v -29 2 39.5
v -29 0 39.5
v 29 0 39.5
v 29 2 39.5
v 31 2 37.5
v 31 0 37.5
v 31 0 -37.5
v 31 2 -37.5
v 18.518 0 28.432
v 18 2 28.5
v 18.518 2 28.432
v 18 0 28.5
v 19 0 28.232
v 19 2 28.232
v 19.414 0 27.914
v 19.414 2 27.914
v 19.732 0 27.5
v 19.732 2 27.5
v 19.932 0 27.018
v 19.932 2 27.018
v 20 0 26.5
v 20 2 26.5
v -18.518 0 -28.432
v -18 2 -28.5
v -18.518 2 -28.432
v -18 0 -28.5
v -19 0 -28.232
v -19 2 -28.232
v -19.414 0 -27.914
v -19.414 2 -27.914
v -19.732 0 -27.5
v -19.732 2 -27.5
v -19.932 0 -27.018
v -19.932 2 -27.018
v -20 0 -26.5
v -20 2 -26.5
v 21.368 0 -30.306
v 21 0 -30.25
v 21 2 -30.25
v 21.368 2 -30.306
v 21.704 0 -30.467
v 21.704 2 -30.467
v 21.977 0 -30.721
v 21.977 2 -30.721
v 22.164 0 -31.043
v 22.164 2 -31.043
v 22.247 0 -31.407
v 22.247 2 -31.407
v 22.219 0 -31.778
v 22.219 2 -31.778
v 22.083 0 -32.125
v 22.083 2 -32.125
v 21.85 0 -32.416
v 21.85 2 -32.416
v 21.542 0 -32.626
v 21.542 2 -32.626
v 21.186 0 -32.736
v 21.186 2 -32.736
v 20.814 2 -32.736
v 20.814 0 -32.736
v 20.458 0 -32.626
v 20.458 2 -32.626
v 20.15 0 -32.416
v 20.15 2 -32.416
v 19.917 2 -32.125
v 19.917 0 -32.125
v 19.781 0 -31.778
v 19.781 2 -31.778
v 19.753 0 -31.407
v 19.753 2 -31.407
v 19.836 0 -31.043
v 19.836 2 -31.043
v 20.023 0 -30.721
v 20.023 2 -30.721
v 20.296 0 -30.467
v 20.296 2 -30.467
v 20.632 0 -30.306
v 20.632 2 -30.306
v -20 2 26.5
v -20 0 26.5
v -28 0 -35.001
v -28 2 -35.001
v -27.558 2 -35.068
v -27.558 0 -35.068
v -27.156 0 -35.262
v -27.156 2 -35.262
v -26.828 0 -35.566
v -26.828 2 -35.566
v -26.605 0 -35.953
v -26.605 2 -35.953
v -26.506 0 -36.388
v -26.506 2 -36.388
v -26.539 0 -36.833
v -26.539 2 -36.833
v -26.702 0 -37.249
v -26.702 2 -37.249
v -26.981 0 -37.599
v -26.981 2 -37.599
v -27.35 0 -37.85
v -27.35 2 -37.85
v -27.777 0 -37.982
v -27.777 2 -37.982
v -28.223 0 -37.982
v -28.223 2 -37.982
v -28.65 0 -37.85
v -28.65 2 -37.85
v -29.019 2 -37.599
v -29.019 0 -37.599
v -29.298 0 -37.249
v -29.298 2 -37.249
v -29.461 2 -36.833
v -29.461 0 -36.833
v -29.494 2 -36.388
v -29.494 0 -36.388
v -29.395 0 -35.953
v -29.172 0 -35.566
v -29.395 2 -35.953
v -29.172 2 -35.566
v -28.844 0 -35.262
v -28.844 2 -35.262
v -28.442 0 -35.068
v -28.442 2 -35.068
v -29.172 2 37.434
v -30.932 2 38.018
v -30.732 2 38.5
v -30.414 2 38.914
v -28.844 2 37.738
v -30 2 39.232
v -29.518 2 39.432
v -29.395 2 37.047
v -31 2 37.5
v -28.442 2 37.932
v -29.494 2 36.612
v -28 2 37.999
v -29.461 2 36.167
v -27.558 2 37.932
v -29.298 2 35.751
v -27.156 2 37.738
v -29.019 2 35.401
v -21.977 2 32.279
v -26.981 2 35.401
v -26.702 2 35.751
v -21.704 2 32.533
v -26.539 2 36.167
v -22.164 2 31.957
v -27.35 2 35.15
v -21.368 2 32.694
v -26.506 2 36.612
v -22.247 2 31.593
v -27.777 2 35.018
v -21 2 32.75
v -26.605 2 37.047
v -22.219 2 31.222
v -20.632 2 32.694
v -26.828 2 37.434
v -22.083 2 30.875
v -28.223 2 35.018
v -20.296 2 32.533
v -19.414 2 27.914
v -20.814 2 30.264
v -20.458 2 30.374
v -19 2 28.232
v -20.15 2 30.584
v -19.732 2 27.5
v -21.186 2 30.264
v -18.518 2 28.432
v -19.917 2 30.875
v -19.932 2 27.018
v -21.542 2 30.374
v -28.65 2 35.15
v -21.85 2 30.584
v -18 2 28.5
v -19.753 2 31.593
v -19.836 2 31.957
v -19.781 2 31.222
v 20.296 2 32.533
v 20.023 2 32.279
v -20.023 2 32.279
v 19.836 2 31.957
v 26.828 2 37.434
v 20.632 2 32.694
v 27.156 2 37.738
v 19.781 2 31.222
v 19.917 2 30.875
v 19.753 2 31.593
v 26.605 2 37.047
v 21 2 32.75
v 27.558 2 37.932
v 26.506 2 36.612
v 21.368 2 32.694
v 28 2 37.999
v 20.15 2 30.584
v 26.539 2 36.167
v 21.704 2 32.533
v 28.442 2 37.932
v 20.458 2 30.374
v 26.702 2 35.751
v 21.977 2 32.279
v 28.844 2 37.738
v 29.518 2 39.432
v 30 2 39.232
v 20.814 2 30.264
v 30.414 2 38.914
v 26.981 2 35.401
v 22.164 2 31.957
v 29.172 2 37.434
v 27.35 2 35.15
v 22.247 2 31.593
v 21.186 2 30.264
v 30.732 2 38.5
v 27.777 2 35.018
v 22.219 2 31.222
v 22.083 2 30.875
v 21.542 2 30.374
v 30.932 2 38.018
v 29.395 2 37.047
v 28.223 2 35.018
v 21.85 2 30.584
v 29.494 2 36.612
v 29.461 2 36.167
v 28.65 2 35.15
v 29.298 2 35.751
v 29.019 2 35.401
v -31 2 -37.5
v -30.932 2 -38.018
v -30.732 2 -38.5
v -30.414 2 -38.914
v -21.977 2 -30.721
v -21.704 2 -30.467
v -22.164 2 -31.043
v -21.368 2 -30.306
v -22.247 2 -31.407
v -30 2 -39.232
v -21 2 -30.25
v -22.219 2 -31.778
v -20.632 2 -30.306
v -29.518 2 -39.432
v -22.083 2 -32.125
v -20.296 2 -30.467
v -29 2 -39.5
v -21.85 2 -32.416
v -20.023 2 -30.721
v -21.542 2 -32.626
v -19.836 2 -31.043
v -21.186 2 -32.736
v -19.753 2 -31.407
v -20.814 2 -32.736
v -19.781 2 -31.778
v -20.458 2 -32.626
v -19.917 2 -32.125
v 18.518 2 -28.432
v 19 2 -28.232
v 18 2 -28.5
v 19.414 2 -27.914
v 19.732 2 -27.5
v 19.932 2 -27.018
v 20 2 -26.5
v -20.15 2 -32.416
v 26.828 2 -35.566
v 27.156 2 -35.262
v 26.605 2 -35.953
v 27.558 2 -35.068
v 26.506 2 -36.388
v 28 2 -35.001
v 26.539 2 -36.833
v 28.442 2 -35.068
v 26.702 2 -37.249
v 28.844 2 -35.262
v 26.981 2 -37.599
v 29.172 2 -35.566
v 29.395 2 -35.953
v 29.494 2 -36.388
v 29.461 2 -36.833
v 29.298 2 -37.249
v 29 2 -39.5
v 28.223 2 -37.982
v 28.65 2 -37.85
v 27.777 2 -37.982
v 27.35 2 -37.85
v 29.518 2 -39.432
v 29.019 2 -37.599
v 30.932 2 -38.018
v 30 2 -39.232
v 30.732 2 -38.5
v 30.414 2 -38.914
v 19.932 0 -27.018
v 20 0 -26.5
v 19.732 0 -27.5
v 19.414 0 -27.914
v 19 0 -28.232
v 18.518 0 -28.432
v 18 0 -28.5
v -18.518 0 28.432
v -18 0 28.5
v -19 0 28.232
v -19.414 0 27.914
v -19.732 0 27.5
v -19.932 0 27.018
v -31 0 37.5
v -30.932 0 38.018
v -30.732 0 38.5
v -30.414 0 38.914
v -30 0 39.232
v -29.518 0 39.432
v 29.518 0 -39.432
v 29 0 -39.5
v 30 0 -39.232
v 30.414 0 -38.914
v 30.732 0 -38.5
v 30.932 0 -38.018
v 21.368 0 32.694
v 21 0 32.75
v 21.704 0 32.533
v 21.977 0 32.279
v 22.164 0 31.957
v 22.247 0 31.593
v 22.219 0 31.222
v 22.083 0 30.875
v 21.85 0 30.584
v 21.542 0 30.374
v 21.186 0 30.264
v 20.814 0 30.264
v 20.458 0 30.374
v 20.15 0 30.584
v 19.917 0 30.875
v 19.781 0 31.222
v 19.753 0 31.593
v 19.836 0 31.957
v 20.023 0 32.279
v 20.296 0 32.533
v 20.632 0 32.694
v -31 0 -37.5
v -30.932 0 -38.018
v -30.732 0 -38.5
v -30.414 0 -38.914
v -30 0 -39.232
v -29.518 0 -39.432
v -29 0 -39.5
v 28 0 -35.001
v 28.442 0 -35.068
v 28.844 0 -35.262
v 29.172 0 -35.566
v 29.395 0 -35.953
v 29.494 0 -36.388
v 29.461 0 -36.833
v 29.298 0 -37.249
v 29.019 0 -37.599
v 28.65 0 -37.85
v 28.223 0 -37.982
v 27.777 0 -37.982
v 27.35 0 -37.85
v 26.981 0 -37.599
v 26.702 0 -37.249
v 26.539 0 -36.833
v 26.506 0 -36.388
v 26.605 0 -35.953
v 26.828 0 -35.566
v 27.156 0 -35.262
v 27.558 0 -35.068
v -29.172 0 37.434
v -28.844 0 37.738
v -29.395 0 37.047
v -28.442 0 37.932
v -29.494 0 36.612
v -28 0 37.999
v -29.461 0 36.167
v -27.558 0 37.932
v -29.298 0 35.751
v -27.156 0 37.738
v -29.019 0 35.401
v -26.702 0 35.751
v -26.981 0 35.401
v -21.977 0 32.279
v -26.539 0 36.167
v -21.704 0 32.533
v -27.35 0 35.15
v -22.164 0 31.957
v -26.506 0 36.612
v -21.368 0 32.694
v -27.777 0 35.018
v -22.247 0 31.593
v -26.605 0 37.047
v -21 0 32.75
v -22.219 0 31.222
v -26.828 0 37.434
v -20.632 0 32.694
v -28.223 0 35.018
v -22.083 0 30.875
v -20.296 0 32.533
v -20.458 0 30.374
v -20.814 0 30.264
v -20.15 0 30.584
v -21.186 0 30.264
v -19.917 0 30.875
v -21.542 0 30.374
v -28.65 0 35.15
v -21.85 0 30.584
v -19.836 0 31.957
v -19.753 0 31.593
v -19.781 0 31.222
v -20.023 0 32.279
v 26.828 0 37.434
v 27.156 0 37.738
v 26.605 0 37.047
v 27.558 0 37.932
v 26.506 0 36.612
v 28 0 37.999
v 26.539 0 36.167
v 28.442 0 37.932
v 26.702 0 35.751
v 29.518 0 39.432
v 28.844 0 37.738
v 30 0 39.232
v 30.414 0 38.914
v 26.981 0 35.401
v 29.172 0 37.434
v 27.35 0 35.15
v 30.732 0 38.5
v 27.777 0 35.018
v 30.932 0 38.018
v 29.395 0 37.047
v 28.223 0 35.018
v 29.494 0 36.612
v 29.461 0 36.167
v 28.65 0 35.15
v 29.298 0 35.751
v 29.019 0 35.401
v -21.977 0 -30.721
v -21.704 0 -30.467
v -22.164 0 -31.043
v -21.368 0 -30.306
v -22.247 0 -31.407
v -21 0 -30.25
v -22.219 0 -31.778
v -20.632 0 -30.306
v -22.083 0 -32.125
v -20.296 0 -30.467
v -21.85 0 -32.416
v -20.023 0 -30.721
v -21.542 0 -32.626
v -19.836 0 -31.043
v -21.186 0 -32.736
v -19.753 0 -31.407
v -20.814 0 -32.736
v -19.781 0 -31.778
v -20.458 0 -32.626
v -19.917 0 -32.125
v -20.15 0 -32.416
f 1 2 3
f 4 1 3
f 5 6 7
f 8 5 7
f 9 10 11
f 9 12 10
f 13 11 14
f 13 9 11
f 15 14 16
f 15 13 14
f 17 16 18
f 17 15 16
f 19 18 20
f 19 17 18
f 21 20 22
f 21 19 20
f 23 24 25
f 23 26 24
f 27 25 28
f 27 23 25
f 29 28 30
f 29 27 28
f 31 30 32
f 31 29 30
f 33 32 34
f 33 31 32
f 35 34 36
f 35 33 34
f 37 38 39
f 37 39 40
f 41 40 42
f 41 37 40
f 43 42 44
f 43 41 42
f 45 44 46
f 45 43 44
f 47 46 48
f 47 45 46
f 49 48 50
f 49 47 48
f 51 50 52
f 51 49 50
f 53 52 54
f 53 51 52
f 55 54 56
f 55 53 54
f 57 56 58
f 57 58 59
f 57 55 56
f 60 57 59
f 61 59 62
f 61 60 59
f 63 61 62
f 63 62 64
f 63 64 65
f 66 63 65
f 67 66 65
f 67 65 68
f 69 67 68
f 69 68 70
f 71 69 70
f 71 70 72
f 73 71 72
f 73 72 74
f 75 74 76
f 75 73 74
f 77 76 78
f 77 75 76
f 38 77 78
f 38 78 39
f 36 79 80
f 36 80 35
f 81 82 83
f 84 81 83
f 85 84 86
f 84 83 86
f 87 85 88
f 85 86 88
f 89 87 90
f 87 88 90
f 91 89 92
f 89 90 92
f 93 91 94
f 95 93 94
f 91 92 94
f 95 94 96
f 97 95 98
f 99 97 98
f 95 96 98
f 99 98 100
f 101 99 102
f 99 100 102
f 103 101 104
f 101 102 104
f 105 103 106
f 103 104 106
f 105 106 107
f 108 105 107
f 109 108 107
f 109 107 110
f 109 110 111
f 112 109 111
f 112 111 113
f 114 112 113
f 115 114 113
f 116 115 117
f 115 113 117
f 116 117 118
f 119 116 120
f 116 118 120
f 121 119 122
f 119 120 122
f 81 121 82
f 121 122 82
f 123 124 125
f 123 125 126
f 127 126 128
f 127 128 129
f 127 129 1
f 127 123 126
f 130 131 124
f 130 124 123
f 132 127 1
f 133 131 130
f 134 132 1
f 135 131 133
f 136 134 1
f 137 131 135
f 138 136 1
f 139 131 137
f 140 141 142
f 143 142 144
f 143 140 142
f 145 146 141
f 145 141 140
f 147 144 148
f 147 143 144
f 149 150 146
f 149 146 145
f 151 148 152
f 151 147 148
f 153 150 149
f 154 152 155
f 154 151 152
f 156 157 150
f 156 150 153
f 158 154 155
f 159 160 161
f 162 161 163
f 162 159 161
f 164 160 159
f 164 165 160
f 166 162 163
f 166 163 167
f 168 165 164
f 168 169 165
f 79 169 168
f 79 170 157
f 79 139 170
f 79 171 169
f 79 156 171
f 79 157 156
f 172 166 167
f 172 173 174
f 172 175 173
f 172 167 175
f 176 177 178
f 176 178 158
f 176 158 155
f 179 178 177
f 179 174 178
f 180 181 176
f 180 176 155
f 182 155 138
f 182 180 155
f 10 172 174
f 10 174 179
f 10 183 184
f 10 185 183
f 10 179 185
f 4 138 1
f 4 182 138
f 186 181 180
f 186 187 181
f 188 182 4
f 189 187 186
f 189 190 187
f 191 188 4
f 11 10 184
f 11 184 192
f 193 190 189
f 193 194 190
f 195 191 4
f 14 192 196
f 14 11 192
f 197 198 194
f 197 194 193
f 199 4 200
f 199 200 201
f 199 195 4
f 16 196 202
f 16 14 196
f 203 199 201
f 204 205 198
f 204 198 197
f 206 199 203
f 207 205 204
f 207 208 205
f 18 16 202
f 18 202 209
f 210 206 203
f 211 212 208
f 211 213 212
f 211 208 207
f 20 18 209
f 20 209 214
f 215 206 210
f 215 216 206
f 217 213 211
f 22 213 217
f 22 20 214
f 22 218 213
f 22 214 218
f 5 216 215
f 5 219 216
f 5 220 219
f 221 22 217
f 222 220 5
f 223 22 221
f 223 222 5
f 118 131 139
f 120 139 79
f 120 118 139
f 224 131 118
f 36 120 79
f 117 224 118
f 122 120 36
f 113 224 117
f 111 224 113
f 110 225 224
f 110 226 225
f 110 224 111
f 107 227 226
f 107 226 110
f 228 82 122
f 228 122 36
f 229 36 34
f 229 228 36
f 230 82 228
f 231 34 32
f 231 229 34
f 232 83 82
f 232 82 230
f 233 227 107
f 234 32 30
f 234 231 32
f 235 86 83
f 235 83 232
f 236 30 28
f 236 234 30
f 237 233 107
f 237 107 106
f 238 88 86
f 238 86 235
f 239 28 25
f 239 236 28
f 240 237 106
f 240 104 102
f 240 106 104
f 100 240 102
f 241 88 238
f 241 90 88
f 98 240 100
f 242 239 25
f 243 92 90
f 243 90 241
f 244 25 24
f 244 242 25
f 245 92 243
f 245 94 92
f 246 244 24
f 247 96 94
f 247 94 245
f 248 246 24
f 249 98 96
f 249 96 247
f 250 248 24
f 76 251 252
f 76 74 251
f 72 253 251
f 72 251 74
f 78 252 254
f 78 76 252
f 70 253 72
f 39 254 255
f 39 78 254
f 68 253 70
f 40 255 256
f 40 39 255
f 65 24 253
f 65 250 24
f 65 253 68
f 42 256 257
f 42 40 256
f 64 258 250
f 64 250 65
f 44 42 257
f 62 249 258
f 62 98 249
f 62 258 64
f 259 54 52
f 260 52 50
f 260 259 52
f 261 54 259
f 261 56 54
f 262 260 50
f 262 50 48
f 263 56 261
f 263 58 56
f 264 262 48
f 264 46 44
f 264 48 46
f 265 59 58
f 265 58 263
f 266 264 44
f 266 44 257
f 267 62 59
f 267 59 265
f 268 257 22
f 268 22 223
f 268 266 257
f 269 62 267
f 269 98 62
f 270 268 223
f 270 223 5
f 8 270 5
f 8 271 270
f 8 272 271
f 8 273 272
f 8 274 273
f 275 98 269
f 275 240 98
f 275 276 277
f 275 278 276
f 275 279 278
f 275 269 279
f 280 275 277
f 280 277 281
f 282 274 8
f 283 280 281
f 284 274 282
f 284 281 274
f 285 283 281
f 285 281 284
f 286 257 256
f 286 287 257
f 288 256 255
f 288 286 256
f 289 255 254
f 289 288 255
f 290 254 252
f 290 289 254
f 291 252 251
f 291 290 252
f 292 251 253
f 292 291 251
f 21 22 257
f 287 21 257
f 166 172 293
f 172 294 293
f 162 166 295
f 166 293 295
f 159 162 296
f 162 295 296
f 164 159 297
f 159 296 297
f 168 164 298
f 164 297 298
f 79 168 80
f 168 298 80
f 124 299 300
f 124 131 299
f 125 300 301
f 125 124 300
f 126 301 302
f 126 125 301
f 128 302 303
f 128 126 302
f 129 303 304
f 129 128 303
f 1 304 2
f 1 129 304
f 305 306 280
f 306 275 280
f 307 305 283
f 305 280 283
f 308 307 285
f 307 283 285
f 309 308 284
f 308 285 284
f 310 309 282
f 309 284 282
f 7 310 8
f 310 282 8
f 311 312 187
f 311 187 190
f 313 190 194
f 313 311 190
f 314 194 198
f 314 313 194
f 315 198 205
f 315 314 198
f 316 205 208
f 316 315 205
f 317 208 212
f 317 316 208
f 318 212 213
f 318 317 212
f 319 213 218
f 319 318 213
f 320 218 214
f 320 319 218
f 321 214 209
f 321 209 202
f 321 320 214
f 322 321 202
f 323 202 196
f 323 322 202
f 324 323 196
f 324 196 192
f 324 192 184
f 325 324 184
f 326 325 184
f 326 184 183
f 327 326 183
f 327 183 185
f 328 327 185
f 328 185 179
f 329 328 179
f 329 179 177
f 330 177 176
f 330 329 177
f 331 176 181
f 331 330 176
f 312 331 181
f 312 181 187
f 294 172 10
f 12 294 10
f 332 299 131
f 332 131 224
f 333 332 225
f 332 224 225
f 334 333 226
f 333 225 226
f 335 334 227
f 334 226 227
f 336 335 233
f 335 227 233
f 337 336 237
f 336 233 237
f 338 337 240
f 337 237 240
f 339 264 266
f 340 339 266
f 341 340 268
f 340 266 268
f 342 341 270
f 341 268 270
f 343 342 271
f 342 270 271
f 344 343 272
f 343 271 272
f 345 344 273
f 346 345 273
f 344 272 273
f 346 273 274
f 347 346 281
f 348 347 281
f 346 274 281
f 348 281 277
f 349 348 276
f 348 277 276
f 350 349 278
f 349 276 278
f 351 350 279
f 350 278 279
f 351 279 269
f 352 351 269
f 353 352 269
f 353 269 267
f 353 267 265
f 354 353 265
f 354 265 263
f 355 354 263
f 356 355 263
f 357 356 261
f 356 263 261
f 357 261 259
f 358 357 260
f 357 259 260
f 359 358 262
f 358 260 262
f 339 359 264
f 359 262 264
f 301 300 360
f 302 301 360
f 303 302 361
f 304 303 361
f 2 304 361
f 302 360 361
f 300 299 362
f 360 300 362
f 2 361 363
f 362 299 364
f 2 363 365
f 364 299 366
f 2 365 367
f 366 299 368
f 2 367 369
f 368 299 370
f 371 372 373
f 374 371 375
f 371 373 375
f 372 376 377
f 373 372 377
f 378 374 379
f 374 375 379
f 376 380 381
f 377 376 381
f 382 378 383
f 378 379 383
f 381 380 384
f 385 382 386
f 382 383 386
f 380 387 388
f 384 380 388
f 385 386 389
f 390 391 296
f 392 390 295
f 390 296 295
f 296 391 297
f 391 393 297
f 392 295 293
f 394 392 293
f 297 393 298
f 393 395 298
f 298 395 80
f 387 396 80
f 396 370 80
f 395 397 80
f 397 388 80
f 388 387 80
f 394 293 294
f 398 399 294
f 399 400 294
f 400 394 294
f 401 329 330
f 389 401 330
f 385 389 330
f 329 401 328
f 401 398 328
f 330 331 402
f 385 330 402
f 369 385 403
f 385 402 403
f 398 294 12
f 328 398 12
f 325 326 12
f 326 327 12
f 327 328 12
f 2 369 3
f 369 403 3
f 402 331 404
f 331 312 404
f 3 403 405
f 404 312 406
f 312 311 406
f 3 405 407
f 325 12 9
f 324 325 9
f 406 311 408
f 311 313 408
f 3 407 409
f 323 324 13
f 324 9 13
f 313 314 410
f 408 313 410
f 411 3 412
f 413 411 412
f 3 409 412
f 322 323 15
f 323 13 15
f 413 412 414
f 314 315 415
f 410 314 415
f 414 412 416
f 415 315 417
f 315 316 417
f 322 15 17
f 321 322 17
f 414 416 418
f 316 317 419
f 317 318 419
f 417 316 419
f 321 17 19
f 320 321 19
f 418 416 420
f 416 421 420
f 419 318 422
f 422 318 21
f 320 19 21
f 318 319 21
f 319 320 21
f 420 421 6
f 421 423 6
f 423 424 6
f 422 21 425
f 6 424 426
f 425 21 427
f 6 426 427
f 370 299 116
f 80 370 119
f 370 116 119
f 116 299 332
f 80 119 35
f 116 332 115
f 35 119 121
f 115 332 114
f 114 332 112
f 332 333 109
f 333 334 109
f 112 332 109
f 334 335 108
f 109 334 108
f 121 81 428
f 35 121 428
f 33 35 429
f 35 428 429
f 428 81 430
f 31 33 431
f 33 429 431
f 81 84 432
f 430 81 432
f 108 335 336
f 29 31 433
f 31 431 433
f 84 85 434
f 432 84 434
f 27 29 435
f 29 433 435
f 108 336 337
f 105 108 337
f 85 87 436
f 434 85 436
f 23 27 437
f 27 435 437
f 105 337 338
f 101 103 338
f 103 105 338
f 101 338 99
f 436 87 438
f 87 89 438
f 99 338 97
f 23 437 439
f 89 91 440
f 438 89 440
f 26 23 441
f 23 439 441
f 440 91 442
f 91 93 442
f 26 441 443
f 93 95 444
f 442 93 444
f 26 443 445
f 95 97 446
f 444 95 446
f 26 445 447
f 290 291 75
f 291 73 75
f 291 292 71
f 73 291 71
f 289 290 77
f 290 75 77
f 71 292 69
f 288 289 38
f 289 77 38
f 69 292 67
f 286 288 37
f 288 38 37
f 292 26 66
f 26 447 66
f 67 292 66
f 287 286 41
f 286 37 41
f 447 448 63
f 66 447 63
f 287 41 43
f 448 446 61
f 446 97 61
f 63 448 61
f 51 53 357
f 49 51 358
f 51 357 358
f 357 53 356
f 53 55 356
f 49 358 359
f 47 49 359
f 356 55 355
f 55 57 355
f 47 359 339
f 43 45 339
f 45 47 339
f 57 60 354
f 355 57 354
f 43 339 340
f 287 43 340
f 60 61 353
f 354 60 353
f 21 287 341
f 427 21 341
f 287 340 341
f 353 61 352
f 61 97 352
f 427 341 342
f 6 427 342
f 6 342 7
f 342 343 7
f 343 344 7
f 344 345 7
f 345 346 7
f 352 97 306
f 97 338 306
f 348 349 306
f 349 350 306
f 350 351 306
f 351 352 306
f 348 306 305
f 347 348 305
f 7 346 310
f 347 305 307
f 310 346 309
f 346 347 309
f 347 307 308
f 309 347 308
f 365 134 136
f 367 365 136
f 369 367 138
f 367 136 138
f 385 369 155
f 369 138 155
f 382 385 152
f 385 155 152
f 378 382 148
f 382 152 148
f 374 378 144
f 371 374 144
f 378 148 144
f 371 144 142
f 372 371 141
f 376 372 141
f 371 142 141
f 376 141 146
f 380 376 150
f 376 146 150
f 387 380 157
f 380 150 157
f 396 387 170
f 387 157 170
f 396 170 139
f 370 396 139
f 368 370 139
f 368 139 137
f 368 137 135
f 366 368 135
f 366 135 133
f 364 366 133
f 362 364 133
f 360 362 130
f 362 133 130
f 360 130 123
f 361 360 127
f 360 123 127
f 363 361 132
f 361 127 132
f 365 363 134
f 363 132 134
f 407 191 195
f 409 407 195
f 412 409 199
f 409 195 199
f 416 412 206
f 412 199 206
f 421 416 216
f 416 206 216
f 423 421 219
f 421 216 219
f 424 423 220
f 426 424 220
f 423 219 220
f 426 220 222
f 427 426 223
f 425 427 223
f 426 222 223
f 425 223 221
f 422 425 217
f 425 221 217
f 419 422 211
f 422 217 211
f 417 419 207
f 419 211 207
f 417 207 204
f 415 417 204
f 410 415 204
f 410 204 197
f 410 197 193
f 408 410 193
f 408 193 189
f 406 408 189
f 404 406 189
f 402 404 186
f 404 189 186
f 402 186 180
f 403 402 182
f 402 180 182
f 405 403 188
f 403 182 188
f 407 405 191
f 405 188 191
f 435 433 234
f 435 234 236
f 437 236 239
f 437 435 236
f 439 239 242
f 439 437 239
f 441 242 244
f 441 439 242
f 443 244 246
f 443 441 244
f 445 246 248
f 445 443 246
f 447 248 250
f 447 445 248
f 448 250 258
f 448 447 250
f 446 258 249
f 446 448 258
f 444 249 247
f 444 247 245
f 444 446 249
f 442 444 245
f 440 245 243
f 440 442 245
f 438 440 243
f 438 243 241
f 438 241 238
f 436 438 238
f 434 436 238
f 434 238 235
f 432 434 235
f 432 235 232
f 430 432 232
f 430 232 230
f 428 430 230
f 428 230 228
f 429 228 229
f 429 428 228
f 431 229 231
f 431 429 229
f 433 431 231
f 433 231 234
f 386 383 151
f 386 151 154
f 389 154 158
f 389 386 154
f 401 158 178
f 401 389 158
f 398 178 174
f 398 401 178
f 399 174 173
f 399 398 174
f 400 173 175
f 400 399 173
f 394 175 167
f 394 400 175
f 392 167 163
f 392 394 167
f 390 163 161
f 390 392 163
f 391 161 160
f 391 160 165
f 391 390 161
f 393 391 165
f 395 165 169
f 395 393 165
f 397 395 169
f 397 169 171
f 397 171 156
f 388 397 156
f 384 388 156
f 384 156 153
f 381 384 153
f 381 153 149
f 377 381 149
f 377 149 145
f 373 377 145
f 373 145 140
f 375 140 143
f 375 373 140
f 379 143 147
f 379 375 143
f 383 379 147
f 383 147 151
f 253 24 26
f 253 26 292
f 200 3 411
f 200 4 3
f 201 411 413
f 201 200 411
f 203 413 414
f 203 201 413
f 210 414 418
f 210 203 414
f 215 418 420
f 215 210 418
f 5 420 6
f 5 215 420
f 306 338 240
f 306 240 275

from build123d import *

# Parameters (mm, degrees)
SKETCH_1_W          = 62
SKETCH_1_H          = 79
SKETCH_1_R          = 1.25
EXTRUDE_1_DEPTH     = 2
SKETCH_2_R          = 1.498589197
CUT_EXTRUDE_1_DEPTH = 2
SKETCH_3_W          = 40
SKETCH_3_H          = 57
CUT_EXTRUDE_2_DEPTH = 2
FILLET_1_R          = 2


with BuildPart() as part:
    # 草图1 → 凸台-拉伸1 (new body)
    with BuildSketch(Plane(origin=(0, 0, 0), x_dir=(1, 0, 0), z_dir=(0, 1, 0))):
        Rectangle(SKETCH_1_W, SKETCH_1_H)
        with Locations(Location((-21, 31.5, 0), (0, 0, 270))):
            Circle(SKETCH_1_R, mode=Mode.SUBTRACT)
        with Locations(Location((21, 31.5, 0), (0, 0, 270))):
            Circle(SKETCH_1_R, mode=Mode.SUBTRACT)
        with Locations(Location((-21, -31.5, 0), (0, 0, 270))):
            Circle(SKETCH_1_R, mode=Mode.SUBTRACT)
        with Locations(Location((21, -31.5, 0), (0, 0, 270))):
            Circle(SKETCH_1_R, mode=Mode.SUBTRACT)
    extrude(amount=EXTRUDE_1_DEPTH)

    # 草图2 → 切除-拉伸1 (cut)
    with BuildSketch(Plane(origin=(0, 2, 0), x_dir=(1, 0, 0), z_dir=(0, 1, 0))):
        with Locations(Location((28, 36.5, 0), (0, 0, 270))):
            Circle(SKETCH_2_R)
        with Locations(Location((-28, 36.5, 0), (0, 0, 270))):
            Circle(SKETCH_2_R)
        with Locations(Location((-28, -36.5, 0), (0, 0, 270))):
            Circle(SKETCH_2_R)
        with Locations(Location((28, -36.5, 0), (0, 0, 270))):
            Circle(SKETCH_2_R)
    extrude(amount=-CUT_EXTRUDE_1_DEPTH, mode=Mode.SUBTRACT)

    # 草图3 → 切除-拉伸2 (cut)
    with BuildSketch(Plane(origin=(0, 2, 0), x_dir=(1, 0, 0), z_dir=(0, 1, 0))):
        Rectangle(SKETCH_3_W, SKETCH_3_H)
    extrude(amount=-CUT_EXTRUDE_2_DEPTH, mode=Mode.SUBTRACT)

    # 圆角1
    fillet_1_edges = [part.edges().sort_by_distance(p)[0] for p in [
        (20, 1, -28.5),
        (20, 1, 28.5),
        (-20, 1, 28.5),
        (-20, 1, -28.5),
        (31, 1, 39.5),
        (-31, 1, 39.5),
        (-31, 1, -39.5),
        (31, 1, -39.5),
    ]]
    fillet(fillet_1_edges, radius=FILLET_1_R)


solid = part.part
